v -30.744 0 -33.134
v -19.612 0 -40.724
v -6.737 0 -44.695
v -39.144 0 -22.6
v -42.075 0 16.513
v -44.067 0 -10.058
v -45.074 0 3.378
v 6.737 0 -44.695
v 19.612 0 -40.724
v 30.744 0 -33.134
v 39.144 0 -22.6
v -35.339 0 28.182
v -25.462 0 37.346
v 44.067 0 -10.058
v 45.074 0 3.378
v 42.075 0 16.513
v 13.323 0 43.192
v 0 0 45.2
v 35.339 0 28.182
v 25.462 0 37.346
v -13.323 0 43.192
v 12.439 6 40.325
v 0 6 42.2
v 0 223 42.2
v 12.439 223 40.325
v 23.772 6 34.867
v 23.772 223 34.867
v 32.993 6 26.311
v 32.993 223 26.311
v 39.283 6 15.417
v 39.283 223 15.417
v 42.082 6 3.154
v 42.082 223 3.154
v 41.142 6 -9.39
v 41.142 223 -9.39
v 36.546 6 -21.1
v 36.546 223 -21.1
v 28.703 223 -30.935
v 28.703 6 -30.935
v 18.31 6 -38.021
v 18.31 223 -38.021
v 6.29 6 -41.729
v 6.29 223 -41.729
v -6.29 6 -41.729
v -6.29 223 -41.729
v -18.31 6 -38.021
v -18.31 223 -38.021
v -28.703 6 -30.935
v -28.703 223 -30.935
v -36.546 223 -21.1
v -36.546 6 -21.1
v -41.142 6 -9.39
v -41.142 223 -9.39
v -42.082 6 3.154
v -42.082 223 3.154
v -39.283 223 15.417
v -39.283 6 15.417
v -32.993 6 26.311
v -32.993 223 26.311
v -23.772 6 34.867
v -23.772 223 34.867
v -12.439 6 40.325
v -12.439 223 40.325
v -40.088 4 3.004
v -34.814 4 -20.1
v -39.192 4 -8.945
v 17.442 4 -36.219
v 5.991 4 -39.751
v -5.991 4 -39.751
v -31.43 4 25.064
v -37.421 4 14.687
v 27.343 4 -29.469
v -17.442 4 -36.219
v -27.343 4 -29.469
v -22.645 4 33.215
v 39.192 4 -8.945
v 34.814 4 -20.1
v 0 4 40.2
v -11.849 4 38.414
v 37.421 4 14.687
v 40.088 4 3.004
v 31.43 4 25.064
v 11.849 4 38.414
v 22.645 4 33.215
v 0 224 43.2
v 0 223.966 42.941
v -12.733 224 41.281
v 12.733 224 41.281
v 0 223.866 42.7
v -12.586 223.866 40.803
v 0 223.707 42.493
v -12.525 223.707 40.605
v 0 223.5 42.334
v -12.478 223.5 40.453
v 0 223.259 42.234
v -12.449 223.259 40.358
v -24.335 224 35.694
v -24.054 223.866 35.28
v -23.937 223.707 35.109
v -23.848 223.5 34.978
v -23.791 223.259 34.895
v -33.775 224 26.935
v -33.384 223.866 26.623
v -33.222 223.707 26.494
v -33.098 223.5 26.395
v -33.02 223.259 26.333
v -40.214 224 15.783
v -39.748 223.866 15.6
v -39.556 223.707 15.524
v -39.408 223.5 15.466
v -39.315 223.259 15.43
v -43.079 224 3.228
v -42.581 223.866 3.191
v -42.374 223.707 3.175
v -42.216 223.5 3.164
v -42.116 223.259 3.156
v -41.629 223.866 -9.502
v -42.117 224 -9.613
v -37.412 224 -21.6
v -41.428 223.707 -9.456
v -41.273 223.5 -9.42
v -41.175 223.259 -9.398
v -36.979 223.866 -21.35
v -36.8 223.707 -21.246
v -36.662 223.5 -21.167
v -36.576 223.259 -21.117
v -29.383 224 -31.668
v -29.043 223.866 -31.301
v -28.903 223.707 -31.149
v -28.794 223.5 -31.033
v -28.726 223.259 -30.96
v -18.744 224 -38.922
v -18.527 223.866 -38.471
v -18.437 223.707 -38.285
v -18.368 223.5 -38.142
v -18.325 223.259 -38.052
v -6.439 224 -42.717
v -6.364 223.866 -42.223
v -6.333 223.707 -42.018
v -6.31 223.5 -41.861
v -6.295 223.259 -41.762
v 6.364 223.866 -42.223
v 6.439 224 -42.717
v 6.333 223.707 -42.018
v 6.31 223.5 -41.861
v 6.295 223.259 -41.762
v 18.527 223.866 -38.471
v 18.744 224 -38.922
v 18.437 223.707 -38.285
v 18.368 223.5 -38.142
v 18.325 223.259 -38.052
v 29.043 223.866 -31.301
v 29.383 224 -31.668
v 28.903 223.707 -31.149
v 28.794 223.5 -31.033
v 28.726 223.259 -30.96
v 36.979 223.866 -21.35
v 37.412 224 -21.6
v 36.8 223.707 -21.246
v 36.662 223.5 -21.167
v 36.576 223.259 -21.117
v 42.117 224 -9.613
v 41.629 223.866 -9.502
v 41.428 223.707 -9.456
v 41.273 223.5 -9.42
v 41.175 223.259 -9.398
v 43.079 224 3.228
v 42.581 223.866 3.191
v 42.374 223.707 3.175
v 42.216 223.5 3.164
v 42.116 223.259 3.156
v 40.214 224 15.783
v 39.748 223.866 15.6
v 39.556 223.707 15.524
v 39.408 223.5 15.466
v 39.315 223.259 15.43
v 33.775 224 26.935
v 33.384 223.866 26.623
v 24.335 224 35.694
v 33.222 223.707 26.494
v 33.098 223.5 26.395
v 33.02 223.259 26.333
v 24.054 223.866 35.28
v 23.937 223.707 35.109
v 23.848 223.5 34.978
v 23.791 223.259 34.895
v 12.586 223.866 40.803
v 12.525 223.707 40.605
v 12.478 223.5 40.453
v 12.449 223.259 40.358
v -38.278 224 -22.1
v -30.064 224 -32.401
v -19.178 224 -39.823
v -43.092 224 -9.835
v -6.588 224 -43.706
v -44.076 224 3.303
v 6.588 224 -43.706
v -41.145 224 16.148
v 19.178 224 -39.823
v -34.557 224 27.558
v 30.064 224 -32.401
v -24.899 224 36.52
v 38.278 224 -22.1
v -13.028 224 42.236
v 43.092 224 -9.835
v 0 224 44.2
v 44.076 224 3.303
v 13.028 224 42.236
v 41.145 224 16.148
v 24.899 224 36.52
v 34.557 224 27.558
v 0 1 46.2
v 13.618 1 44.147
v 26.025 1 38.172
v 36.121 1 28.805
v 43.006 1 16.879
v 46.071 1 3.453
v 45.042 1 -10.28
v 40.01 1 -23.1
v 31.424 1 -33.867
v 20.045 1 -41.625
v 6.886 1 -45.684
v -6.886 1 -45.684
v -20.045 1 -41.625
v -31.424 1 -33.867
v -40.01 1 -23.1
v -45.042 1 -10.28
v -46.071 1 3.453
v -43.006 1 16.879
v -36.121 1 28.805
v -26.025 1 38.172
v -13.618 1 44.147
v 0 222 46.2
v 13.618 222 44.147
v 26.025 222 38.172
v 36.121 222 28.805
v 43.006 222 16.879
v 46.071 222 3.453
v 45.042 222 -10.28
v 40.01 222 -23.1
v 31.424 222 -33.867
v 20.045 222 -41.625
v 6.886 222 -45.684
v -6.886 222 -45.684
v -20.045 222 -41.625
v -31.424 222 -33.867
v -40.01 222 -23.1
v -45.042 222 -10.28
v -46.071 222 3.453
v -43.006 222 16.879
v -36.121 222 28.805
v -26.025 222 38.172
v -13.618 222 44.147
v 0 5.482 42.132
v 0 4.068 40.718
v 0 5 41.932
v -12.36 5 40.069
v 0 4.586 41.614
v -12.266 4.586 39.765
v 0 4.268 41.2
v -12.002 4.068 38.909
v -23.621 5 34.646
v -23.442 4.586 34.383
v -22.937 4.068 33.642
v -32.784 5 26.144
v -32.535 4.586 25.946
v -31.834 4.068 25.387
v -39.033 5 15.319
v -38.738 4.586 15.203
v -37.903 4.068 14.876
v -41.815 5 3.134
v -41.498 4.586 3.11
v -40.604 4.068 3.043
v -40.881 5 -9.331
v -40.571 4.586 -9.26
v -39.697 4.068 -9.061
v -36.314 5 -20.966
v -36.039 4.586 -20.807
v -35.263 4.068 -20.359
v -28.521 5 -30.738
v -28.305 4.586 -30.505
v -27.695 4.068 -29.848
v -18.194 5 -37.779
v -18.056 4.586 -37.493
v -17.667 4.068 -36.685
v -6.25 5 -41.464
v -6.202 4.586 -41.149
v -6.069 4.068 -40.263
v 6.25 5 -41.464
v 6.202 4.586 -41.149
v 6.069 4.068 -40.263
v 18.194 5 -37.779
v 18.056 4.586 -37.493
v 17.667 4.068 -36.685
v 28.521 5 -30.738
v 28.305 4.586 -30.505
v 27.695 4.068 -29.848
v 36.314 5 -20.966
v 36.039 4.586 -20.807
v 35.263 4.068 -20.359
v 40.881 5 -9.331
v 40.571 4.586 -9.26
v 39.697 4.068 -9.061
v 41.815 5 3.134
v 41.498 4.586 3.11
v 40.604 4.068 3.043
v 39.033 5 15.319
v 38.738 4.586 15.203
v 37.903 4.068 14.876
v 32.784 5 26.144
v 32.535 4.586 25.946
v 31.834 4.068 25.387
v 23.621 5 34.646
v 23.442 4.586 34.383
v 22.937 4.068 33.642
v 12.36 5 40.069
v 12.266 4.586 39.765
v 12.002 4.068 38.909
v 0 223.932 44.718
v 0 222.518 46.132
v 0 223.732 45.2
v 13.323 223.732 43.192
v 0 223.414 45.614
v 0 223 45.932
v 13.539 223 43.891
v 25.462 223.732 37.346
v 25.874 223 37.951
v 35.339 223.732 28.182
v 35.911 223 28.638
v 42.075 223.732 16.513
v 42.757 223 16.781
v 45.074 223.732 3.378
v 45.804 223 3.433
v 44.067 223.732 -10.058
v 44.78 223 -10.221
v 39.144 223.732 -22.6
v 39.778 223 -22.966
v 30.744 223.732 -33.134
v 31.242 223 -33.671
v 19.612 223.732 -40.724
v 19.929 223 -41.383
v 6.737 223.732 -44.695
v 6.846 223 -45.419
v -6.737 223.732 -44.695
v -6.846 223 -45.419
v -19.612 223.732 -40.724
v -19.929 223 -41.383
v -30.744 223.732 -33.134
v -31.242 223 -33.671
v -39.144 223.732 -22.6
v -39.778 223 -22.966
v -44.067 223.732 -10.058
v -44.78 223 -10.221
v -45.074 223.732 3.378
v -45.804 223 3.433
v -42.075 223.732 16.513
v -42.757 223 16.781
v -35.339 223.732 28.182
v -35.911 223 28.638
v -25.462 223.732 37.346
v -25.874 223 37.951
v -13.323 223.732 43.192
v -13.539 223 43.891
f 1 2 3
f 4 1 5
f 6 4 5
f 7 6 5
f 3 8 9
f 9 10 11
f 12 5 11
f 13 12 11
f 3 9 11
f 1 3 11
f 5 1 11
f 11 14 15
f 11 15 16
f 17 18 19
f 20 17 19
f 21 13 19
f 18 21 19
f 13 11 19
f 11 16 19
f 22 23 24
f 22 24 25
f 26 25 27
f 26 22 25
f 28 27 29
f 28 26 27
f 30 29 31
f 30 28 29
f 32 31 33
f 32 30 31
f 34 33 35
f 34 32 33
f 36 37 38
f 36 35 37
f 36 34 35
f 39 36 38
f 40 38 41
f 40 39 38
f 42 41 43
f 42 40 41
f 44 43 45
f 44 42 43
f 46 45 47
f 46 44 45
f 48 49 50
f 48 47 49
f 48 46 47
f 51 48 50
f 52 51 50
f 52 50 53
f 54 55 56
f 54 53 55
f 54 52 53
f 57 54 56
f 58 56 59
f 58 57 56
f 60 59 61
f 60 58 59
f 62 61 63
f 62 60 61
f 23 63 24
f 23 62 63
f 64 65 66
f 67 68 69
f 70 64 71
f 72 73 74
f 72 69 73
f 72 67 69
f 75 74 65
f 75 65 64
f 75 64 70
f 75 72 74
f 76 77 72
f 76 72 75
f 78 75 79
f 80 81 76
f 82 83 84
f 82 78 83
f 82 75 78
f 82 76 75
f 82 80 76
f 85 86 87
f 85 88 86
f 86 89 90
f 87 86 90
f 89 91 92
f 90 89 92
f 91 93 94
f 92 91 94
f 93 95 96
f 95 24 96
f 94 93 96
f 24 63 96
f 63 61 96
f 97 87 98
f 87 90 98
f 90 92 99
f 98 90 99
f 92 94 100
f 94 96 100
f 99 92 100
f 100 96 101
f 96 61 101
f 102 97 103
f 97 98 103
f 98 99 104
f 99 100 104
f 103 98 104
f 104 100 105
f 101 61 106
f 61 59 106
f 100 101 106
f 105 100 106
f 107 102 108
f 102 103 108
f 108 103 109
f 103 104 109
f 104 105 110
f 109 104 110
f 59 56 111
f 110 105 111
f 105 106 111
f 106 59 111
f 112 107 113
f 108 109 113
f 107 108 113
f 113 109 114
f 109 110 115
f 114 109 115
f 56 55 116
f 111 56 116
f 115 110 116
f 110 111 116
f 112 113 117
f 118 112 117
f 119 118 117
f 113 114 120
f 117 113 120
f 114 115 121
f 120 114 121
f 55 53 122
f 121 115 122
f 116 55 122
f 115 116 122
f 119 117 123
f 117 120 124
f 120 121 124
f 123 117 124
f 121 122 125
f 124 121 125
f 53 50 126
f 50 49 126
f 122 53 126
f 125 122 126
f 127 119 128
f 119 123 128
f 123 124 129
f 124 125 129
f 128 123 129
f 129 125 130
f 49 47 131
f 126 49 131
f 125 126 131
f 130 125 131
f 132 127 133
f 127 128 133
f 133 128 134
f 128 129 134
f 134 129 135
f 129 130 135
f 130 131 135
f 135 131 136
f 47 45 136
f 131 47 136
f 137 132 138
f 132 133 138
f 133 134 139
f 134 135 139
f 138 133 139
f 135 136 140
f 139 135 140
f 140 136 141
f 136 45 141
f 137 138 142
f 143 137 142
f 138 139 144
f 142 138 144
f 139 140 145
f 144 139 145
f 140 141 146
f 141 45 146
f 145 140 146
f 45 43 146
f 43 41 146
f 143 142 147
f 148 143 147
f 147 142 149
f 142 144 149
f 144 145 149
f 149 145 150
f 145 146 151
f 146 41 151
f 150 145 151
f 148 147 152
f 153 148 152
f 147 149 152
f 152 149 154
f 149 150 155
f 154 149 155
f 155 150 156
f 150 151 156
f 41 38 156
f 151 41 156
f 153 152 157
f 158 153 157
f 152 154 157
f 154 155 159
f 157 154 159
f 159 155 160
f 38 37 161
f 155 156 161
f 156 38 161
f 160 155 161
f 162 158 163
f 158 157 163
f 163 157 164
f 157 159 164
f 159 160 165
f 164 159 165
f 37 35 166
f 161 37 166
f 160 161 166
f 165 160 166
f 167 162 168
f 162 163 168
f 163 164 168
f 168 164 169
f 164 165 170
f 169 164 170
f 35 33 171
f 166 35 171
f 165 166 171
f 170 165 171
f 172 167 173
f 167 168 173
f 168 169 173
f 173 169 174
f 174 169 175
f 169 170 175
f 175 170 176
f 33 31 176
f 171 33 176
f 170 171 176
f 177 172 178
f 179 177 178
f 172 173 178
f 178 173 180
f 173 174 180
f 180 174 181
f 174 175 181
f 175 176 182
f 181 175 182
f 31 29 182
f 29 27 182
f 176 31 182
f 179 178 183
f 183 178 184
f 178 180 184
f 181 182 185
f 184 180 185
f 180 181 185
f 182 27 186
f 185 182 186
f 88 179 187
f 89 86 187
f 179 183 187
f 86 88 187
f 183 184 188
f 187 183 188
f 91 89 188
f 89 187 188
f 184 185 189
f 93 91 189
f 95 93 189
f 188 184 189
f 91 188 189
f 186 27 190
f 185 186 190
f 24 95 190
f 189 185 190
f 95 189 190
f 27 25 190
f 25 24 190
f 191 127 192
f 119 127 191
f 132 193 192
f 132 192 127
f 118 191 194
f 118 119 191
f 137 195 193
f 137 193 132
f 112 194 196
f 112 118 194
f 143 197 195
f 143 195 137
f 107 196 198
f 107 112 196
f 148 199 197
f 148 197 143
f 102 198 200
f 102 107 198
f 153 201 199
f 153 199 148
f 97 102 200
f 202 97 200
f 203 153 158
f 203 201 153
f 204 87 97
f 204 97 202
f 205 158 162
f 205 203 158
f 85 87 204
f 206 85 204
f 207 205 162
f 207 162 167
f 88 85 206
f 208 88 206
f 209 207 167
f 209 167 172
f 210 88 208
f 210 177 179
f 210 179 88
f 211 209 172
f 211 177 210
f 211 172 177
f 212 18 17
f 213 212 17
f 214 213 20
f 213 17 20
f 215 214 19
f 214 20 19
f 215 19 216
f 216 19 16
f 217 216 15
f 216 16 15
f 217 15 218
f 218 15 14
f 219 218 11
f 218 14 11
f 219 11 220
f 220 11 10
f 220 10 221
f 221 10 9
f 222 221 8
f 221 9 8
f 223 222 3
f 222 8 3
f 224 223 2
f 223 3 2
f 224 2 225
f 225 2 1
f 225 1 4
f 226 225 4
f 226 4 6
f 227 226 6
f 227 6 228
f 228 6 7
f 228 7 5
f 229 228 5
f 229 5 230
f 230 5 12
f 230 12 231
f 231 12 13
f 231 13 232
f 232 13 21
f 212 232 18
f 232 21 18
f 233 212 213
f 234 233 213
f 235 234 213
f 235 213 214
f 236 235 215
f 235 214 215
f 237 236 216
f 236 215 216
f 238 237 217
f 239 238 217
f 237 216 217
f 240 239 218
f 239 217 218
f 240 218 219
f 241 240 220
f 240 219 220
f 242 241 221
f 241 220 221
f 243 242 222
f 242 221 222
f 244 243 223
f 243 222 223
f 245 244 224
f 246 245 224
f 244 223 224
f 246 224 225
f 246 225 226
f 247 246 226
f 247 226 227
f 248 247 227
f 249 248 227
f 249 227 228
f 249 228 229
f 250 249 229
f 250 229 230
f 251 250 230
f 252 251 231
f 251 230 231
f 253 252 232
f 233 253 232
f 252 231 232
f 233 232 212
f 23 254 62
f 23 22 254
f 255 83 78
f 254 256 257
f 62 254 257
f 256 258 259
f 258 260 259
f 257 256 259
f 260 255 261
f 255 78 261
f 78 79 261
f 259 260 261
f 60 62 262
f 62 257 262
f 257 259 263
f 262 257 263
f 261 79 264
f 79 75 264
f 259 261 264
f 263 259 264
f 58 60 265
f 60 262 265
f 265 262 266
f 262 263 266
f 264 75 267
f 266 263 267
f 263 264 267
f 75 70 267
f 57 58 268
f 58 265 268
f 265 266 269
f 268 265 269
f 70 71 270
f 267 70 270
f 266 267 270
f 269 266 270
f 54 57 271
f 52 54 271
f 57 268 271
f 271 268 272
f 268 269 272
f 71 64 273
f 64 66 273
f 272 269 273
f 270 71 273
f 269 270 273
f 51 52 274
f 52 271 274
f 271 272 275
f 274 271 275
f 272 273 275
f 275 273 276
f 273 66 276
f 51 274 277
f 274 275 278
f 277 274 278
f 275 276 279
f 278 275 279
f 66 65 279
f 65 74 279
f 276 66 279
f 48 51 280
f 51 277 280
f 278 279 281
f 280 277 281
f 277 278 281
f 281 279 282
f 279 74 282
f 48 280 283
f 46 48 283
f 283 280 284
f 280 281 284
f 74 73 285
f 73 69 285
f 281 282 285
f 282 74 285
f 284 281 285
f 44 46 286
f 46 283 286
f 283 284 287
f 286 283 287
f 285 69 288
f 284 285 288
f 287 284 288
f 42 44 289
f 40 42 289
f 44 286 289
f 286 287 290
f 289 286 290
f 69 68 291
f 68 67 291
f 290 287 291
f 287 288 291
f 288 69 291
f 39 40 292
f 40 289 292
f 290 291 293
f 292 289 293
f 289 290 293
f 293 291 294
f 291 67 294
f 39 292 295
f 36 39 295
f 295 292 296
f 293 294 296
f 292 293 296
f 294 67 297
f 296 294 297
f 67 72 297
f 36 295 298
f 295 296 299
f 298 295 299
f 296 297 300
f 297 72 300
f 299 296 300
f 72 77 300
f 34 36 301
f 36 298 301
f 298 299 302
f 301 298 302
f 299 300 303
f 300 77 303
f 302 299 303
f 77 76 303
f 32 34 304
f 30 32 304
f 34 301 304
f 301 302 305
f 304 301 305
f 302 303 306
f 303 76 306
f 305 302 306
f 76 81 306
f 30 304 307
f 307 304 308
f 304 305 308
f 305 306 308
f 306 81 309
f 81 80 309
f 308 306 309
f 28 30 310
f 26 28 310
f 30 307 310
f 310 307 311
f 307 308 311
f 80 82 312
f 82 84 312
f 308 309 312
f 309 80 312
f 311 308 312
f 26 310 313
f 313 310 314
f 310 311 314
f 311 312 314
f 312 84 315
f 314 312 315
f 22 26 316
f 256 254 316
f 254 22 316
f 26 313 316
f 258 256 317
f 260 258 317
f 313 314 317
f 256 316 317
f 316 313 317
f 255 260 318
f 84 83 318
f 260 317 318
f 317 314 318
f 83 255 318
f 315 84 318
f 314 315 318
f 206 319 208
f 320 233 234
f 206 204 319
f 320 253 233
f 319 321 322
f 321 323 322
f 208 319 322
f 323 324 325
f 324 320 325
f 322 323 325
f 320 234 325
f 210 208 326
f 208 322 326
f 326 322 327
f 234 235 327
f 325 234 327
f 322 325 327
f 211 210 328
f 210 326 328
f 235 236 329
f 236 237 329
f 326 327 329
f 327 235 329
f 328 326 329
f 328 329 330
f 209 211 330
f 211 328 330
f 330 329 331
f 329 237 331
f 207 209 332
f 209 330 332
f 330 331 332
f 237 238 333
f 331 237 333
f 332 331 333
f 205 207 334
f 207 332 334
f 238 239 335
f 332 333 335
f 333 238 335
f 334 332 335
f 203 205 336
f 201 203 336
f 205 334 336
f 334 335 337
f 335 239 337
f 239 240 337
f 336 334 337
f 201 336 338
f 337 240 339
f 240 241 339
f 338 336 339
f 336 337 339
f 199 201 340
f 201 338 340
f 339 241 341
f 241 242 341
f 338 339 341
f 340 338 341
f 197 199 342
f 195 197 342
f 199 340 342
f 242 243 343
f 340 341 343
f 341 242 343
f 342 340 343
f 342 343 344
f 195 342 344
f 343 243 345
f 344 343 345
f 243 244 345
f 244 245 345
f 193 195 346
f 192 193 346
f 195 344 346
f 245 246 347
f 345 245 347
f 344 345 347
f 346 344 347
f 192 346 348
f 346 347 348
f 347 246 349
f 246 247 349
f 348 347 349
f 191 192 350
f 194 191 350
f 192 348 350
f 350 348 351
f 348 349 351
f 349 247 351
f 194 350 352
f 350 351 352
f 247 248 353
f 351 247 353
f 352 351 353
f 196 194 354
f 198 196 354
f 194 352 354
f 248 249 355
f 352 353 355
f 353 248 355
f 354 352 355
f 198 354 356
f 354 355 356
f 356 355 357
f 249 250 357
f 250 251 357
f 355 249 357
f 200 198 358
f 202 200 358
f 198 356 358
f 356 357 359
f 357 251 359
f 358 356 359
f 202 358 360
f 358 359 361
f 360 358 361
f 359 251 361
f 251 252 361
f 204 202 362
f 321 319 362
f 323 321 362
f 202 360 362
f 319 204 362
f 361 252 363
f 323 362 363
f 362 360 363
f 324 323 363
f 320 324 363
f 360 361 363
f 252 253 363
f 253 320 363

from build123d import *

# Parameters (mm, degrees)
SKETCH1_R           = 46.2
BOSS_EXTRUDE1_DEPTH = 224
SHELL1_T            = -4
FILLET1_R           = 2
FILLET2_R           = 2
FILLET3_R           = 1
CHAMFER1_SIZE       = 1


with BuildPart() as part:
    # Sketch1 → Boss-Extrude1 (new body)
    with BuildSketch(Plane(origin=(0, 0, 0), x_dir=(1, 0, 0), z_dir=(0, 1, 0))):
        with Locations(Location((0, 0, 0), (0, 0, 270))):
            Circle(SKETCH1_R)
    extrude(amount=BOSS_EXTRUDE1_DEPTH)

    # Shell1
    shell1_openings = [part.faces().sort_by_distance(p)[0] for p in [
        (0, 224, 0),
    ]]
    offset(amount=SHELL1_T, openings=shell1_openings, kind=Kind.INTERSECTION)

    # Fillet1
    fillet1_edges = [part.edges().sort_by_distance(p)[0] for p in [
        (0, 4, -42.2),
    ]]
    fillet(fillet1_edges, radius=FILLET1_R)

    # Fillet2
    fillet2_edges = [part.edges().sort_by_distance(p)[0] for p in [
        (0, 224, -46.2),
    ]]
    fillet(fillet2_edges, radius=FILLET2_R)

    # Fillet3
    fillet3_edges = [part.edges().sort_by_distance(p)[0] for p in [
        (0, 224, -42.2),
    ]]
    fillet(fillet3_edges, radius=FILLET3_R)

    # Chamfer1
    chamfer1_edges = [part.edges().sort_by_distance(p)[0] for p in [
        (0, 0, -46.2),
    ]]
    chamfer(chamfer1_edges, length=CHAMFER1_SIZE)


solid = part.part
